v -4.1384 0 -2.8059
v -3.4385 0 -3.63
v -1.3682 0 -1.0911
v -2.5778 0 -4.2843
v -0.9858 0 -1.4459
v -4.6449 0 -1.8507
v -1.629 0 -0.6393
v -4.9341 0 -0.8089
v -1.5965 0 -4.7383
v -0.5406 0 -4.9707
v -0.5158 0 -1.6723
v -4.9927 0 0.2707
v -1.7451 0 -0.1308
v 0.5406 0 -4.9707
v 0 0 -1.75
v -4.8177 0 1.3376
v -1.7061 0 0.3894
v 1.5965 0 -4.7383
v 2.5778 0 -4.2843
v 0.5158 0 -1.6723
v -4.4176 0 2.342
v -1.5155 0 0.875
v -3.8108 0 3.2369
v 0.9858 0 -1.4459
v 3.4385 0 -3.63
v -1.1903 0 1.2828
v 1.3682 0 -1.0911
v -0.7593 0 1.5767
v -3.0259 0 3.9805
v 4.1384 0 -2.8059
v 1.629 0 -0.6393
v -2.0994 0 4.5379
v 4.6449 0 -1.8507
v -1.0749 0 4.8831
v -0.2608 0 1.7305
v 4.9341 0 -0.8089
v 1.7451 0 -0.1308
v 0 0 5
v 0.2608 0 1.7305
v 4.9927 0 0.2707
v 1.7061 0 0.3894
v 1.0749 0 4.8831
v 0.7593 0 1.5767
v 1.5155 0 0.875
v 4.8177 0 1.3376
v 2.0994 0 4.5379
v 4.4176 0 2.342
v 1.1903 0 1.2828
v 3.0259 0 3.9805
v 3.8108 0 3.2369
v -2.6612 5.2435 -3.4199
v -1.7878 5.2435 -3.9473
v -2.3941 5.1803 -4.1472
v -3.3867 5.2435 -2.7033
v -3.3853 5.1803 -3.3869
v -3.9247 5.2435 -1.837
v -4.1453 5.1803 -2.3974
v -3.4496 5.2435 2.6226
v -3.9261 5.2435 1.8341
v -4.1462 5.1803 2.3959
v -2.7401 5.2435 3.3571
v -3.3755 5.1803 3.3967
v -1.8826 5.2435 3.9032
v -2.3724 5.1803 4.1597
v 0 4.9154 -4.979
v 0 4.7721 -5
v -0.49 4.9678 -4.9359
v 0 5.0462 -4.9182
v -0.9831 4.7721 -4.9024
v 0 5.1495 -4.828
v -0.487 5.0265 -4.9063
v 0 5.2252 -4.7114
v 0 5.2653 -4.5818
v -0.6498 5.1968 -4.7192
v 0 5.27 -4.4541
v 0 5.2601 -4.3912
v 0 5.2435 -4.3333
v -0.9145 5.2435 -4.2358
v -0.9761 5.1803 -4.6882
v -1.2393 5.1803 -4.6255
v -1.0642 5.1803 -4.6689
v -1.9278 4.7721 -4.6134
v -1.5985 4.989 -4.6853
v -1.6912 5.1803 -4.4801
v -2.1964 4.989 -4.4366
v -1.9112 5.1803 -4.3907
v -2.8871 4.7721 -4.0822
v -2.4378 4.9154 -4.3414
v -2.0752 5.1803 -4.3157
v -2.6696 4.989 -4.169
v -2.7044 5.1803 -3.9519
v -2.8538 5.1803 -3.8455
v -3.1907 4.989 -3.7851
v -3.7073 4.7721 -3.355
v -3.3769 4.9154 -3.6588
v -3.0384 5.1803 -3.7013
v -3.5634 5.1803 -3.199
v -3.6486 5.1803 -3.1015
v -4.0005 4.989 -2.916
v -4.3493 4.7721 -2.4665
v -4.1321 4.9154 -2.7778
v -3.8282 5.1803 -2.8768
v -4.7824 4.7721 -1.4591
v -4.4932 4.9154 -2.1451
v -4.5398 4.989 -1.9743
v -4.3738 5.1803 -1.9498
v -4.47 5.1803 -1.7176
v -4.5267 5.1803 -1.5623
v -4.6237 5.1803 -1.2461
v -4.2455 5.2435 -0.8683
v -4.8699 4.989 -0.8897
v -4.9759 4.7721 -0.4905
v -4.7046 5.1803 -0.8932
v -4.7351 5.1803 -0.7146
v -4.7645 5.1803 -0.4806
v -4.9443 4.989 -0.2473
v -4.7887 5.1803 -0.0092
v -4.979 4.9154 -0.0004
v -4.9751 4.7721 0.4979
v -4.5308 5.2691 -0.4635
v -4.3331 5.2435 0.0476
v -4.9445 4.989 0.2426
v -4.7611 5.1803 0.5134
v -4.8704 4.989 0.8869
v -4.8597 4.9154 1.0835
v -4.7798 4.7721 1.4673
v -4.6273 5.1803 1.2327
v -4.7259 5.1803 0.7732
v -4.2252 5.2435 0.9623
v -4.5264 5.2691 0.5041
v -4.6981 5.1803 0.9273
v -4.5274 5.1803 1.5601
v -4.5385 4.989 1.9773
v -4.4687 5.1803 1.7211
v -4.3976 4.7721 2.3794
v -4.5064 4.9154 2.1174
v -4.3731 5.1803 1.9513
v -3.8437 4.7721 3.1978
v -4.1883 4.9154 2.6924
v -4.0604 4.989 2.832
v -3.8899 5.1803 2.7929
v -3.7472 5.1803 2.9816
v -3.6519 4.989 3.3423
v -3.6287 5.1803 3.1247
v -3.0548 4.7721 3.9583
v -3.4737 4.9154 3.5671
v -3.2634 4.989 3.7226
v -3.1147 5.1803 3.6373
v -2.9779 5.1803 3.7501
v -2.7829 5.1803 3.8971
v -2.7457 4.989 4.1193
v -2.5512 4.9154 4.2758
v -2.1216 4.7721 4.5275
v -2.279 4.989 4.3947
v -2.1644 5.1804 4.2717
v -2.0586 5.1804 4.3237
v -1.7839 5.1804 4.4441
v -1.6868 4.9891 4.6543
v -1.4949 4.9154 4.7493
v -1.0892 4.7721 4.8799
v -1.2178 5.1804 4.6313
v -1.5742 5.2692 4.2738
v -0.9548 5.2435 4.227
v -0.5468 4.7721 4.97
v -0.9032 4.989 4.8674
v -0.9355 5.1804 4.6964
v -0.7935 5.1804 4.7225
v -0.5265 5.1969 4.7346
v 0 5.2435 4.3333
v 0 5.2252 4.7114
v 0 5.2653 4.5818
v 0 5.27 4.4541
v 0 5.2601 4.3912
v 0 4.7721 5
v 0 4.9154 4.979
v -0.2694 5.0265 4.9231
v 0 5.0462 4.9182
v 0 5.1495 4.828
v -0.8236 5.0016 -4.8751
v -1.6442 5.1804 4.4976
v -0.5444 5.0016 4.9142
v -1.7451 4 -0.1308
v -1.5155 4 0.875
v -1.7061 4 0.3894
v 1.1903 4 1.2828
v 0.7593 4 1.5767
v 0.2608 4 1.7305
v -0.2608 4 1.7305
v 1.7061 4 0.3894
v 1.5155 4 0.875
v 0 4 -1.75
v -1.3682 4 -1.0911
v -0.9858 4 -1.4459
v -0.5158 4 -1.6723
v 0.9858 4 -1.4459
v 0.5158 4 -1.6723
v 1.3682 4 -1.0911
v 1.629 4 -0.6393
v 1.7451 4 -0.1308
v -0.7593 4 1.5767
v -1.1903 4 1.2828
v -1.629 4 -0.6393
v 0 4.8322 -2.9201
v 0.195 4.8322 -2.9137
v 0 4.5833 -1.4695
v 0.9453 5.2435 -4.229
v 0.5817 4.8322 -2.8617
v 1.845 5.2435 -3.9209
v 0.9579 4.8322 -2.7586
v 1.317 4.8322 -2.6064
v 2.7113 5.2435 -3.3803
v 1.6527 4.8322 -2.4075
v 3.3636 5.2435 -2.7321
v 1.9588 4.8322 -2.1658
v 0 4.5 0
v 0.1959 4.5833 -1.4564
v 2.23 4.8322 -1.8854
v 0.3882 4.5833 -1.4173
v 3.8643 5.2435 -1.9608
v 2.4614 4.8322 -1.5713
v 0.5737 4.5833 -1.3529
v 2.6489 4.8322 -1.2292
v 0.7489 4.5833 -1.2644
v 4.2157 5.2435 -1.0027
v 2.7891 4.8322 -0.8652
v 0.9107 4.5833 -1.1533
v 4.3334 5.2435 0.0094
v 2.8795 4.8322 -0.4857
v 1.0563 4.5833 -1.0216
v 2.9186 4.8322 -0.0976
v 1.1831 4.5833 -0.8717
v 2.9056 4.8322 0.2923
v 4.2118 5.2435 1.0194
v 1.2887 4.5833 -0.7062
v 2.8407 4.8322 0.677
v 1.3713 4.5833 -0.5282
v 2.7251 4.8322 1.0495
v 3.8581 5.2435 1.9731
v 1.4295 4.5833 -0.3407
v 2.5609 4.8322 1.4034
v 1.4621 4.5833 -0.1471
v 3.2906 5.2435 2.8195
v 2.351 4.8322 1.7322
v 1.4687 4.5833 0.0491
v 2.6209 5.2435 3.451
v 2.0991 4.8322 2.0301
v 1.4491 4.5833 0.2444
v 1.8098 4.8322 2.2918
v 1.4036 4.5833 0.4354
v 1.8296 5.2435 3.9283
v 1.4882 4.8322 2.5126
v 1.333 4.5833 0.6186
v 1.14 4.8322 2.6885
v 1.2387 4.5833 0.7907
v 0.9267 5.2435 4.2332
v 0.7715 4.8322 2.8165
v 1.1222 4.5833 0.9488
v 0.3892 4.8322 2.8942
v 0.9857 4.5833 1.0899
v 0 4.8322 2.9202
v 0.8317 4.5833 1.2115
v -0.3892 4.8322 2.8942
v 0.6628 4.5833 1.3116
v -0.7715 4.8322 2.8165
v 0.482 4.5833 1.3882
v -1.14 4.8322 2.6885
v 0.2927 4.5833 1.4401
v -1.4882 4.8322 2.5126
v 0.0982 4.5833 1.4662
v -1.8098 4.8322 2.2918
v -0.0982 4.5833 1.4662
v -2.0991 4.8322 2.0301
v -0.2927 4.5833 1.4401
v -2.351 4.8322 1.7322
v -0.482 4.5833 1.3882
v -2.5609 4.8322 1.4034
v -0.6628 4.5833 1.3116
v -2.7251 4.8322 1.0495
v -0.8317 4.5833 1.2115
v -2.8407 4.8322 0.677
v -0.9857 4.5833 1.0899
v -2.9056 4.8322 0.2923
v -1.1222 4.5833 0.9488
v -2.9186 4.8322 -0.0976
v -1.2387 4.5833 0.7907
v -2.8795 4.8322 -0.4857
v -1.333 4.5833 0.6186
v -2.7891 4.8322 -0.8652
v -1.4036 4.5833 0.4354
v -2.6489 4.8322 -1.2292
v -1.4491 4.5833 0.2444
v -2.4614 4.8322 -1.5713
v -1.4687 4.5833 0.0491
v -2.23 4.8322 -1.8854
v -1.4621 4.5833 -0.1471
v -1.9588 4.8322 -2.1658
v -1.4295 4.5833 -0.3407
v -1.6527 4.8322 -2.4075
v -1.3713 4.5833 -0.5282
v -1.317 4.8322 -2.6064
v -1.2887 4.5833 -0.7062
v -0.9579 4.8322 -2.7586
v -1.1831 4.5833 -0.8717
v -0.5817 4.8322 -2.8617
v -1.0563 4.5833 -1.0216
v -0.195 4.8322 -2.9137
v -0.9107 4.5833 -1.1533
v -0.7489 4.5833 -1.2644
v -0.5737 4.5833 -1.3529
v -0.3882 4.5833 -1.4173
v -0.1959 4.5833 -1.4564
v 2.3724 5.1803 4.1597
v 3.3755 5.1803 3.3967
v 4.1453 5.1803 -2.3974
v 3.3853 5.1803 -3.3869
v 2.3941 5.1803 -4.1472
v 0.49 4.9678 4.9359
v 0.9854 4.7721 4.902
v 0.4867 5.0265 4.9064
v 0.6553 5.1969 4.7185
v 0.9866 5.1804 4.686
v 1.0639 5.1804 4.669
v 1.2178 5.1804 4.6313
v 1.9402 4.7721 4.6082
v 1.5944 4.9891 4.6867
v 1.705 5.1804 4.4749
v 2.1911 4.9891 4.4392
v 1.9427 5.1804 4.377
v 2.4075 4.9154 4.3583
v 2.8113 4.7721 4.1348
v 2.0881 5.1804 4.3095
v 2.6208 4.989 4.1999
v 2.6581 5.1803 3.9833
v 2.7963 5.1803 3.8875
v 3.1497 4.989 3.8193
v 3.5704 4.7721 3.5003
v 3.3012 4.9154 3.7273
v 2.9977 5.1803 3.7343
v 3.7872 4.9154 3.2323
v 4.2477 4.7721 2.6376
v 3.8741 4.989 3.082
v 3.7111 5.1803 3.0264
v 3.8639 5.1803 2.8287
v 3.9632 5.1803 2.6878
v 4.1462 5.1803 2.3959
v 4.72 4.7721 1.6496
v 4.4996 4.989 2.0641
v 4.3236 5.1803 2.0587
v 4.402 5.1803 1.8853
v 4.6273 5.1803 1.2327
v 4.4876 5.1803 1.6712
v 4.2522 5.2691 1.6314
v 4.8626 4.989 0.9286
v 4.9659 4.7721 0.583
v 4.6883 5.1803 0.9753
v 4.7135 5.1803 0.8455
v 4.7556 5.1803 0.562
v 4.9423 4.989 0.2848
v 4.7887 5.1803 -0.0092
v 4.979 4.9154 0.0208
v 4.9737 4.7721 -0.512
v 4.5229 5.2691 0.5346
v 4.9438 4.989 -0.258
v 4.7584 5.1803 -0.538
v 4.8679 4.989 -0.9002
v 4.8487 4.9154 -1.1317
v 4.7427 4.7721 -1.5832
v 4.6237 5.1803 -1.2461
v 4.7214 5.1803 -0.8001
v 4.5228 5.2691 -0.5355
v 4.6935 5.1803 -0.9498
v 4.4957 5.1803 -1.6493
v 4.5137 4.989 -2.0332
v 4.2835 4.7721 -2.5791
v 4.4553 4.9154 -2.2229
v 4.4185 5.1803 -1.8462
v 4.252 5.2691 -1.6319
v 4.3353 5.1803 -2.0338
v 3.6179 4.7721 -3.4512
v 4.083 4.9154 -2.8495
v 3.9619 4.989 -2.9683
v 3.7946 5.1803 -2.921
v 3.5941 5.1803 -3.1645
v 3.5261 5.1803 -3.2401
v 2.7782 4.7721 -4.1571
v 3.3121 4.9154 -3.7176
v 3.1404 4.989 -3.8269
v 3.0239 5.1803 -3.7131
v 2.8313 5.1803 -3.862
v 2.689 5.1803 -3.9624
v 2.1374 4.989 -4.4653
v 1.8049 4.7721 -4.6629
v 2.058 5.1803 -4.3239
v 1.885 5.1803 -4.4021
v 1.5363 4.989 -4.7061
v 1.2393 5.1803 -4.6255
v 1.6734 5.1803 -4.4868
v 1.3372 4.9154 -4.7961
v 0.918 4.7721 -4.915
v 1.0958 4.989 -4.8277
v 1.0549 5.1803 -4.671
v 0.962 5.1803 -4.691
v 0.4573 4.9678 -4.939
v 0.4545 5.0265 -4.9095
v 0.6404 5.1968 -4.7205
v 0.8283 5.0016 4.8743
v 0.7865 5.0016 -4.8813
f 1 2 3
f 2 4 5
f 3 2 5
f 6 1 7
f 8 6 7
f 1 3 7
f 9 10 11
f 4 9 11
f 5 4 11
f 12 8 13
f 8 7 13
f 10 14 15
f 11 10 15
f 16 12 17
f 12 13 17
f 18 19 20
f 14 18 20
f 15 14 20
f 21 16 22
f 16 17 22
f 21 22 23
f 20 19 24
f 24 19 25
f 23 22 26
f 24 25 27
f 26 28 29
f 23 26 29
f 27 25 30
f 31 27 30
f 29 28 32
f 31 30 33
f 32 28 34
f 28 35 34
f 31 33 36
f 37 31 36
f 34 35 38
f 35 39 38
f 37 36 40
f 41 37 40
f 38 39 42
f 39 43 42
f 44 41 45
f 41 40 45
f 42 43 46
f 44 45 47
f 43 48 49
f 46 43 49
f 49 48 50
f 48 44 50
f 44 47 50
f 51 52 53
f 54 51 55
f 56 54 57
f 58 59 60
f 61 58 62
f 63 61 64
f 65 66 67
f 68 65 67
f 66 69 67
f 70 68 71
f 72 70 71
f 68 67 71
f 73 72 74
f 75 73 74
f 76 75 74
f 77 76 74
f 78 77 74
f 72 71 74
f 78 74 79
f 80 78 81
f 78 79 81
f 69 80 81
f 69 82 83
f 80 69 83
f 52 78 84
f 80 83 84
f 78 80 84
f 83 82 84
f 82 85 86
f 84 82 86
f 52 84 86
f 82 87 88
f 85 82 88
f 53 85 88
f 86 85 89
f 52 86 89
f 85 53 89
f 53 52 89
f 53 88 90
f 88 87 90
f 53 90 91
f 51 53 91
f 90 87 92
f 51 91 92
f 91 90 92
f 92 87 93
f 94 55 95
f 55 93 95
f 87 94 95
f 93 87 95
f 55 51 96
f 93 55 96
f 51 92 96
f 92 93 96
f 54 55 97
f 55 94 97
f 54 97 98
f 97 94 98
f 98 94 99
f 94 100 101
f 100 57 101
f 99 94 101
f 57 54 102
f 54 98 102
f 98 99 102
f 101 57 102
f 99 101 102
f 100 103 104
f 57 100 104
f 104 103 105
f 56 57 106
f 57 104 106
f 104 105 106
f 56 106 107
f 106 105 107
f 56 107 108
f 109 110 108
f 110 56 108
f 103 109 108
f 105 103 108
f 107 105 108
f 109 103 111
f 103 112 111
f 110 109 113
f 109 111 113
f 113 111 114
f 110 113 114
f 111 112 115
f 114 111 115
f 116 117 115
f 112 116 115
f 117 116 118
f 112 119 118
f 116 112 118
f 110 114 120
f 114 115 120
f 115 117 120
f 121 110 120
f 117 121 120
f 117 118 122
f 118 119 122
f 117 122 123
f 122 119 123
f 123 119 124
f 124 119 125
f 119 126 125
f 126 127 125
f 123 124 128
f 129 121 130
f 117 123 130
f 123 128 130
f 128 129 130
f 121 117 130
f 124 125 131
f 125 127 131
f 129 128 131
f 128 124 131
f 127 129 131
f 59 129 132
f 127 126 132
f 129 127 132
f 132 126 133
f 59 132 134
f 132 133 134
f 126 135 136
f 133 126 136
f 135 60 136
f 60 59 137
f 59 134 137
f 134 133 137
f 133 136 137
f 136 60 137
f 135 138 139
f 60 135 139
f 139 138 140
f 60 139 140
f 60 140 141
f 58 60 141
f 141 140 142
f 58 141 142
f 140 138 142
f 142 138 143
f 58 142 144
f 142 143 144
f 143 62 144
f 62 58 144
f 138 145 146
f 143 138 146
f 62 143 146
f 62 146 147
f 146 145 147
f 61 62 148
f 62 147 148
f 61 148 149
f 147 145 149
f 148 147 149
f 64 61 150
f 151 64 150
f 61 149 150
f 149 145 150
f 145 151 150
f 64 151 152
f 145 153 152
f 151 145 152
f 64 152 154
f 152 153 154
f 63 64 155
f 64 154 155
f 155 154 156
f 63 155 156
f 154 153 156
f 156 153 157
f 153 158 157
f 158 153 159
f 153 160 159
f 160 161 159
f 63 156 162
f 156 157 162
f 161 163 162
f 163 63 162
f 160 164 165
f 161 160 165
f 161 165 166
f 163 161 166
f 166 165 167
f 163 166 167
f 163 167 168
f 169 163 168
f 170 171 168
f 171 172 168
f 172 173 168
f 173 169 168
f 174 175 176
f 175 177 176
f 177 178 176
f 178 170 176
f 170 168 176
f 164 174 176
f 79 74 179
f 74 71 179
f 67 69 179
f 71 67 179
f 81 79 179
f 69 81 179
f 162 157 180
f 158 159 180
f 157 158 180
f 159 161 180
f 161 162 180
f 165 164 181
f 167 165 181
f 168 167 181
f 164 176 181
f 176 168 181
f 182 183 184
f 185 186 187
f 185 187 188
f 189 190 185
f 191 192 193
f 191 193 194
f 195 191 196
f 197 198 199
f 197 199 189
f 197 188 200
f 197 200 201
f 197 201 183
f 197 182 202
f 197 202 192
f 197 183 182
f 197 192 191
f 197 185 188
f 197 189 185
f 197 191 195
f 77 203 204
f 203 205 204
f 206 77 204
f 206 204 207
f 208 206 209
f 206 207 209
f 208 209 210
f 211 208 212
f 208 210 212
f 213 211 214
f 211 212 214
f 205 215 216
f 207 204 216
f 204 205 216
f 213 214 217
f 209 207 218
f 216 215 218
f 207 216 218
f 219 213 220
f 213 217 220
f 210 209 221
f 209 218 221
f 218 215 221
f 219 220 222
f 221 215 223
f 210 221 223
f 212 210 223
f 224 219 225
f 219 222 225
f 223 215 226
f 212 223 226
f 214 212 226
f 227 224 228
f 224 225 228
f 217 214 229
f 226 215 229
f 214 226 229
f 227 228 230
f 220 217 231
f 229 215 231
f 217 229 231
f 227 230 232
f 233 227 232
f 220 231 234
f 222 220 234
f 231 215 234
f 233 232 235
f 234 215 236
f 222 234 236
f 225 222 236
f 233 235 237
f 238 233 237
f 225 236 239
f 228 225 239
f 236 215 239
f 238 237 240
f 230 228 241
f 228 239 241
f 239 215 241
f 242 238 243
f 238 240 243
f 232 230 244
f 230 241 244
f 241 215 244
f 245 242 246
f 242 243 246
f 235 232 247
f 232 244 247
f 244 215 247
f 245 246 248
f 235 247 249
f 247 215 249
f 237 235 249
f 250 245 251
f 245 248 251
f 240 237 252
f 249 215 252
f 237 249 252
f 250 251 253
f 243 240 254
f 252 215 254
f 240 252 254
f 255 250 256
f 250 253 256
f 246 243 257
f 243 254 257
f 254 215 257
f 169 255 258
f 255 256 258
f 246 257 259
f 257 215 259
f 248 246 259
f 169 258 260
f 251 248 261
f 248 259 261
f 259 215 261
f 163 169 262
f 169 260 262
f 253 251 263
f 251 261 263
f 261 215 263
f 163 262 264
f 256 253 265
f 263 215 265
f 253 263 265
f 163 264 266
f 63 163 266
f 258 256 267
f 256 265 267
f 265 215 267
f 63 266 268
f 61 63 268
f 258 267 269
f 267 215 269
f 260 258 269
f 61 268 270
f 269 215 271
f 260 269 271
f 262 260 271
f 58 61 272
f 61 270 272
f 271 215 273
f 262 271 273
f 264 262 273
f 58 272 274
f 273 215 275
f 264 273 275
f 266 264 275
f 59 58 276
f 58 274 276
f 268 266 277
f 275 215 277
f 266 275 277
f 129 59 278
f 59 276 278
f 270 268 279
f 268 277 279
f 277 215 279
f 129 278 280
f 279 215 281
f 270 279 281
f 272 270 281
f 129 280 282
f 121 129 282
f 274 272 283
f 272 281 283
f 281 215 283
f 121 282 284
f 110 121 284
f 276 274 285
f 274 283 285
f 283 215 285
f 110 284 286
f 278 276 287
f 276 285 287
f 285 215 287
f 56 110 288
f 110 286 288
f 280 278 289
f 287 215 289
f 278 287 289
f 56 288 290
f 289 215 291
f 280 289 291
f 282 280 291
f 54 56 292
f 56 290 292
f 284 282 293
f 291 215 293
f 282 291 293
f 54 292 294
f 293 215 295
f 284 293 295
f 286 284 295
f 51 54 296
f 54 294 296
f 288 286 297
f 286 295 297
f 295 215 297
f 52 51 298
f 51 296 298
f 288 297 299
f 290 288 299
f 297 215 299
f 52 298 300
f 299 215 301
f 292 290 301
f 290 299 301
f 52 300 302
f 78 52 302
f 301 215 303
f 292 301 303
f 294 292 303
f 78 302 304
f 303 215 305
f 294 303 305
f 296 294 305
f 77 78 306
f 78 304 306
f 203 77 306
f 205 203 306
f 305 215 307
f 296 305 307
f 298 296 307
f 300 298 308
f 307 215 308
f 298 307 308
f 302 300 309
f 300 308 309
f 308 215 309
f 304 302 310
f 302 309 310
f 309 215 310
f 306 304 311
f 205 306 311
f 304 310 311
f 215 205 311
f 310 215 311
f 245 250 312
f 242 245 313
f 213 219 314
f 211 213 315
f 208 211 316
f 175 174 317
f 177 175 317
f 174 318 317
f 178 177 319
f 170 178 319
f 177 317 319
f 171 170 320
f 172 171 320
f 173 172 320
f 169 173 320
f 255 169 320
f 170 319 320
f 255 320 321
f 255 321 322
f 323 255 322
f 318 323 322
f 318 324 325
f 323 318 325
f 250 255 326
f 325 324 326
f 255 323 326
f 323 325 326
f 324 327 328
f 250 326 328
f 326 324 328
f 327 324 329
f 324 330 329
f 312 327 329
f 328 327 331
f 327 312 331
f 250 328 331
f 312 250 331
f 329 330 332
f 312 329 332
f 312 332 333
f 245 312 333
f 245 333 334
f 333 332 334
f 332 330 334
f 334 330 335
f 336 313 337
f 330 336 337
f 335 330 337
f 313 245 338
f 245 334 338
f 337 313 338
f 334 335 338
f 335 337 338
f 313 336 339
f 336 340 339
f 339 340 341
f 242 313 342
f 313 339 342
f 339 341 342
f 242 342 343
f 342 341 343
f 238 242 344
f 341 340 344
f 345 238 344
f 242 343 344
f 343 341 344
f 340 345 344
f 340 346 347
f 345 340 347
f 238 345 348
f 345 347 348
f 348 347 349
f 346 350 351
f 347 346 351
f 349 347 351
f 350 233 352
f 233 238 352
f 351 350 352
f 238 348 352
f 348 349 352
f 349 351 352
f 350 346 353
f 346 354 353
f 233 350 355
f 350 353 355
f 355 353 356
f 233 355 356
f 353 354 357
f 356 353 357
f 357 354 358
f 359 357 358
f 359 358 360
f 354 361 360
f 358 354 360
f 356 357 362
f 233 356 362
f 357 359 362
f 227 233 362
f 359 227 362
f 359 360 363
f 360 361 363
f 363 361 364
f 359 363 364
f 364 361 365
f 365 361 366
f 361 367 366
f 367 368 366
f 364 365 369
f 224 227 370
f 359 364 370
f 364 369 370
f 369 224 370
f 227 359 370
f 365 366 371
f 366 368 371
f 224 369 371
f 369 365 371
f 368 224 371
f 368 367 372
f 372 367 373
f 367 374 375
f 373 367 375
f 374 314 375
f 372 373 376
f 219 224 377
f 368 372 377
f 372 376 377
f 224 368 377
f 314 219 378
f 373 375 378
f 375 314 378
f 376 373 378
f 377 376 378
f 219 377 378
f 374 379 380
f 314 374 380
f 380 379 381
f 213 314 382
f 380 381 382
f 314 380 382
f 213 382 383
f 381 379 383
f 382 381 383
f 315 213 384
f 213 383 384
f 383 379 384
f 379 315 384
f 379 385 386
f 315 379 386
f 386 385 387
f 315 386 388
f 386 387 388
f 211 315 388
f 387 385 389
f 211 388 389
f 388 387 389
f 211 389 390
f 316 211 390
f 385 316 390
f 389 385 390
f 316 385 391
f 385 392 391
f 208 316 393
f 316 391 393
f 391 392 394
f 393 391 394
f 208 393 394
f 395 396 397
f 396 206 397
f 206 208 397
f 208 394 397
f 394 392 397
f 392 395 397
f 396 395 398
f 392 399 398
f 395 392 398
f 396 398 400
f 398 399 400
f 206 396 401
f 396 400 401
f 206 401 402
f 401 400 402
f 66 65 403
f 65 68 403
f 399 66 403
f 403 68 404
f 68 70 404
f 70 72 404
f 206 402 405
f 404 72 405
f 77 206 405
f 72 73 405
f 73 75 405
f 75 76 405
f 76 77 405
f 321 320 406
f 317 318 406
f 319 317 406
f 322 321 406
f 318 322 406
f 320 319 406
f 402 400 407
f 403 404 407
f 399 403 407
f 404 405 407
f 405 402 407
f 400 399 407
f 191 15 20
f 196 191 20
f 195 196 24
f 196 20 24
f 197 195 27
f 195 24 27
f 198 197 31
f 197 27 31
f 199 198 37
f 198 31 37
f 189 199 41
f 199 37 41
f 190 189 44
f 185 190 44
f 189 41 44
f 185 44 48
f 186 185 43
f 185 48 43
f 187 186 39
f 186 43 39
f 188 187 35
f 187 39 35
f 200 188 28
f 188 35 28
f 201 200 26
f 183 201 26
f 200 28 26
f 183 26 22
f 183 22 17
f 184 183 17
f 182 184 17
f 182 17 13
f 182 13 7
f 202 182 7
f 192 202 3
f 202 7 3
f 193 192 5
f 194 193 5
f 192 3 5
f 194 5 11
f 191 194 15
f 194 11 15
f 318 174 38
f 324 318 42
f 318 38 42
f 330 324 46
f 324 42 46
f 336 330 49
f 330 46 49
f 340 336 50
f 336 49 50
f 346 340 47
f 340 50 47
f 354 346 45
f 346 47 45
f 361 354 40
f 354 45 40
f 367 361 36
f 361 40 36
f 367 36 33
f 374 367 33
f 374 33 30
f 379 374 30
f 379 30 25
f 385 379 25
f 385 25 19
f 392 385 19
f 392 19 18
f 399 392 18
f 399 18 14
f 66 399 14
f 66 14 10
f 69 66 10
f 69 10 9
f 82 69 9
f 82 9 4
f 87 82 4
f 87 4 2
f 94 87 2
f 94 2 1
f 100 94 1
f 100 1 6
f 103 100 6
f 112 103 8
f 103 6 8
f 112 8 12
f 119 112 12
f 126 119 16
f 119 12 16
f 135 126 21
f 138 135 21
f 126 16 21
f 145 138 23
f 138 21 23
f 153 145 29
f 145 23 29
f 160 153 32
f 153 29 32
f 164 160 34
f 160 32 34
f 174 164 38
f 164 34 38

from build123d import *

# Parameters (mm, degrees)
SKETCH1_R           = 5
BOSS_EXTRUDE1_DEPTH = 5.5
SKETCH2_R           = 1.75
CUT_EXTRUDE1_DEPTH  = 4
DOME1_FACE_RADIUS   = 5
DOME1_HEIGHT        = 1
FILLET1_R           = 0.5


with BuildPart() as part:
    # Sketch1 → Boss-Extrude1 (new body)
    with BuildSketch(Plane(origin=(0, 0, 0), x_dir=(1, 0, 0), z_dir=(0, 1, 0))):
        with Locations(Location((0, 0, 0), (0, 0, 270))):
            Circle(SKETCH1_R)
    extrude(amount=BOSS_EXTRUDE1_DEPTH)

    # Sketch2 → Cut-Extrude1 (cut)
    with BuildSketch(Plane.XZ):
        with Locations(Location((0, 0, 0), (0, 0, 270))):
            Circle(SKETCH2_R)
    extrude(amount=-CUT_EXTRUDE1_DEPTH, mode=Mode.SUBTRACT)

    # Dome1: a dome of height H over a round flat face of radius A is a cap of a sphere of radius (A * A + H * H) / (2 * H)
    dome1_r = (DOME1_FACE_RADIUS * DOME1_FACE_RADIUS + DOME1_HEIGHT * DOME1_HEIGHT) / (2 * DOME1_HEIGHT)
    dome1_base = Plane((0, 5.5, 0), z_dir=(0, -1, 0))
    with Locations(dome1_base.offset(DOME1_HEIGHT - dome1_r)):
        dome1_ball = Sphere(dome1_r, mode=Mode.PRIVATE)
    add(split(dome1_ball, bisect_by=dome1_base, keep=Keep.TOP, mode=Mode.PRIVATE), mode=Mode.SUBTRACT)

    # Fillet1
    fillet1_edges = [part.edges().sort_by_distance(p)[0] for p in [
        (-5, 5.5, 0),
    ]]
    fillet(fillet1_edges, radius=FILLET1_R)


solid = part.part
